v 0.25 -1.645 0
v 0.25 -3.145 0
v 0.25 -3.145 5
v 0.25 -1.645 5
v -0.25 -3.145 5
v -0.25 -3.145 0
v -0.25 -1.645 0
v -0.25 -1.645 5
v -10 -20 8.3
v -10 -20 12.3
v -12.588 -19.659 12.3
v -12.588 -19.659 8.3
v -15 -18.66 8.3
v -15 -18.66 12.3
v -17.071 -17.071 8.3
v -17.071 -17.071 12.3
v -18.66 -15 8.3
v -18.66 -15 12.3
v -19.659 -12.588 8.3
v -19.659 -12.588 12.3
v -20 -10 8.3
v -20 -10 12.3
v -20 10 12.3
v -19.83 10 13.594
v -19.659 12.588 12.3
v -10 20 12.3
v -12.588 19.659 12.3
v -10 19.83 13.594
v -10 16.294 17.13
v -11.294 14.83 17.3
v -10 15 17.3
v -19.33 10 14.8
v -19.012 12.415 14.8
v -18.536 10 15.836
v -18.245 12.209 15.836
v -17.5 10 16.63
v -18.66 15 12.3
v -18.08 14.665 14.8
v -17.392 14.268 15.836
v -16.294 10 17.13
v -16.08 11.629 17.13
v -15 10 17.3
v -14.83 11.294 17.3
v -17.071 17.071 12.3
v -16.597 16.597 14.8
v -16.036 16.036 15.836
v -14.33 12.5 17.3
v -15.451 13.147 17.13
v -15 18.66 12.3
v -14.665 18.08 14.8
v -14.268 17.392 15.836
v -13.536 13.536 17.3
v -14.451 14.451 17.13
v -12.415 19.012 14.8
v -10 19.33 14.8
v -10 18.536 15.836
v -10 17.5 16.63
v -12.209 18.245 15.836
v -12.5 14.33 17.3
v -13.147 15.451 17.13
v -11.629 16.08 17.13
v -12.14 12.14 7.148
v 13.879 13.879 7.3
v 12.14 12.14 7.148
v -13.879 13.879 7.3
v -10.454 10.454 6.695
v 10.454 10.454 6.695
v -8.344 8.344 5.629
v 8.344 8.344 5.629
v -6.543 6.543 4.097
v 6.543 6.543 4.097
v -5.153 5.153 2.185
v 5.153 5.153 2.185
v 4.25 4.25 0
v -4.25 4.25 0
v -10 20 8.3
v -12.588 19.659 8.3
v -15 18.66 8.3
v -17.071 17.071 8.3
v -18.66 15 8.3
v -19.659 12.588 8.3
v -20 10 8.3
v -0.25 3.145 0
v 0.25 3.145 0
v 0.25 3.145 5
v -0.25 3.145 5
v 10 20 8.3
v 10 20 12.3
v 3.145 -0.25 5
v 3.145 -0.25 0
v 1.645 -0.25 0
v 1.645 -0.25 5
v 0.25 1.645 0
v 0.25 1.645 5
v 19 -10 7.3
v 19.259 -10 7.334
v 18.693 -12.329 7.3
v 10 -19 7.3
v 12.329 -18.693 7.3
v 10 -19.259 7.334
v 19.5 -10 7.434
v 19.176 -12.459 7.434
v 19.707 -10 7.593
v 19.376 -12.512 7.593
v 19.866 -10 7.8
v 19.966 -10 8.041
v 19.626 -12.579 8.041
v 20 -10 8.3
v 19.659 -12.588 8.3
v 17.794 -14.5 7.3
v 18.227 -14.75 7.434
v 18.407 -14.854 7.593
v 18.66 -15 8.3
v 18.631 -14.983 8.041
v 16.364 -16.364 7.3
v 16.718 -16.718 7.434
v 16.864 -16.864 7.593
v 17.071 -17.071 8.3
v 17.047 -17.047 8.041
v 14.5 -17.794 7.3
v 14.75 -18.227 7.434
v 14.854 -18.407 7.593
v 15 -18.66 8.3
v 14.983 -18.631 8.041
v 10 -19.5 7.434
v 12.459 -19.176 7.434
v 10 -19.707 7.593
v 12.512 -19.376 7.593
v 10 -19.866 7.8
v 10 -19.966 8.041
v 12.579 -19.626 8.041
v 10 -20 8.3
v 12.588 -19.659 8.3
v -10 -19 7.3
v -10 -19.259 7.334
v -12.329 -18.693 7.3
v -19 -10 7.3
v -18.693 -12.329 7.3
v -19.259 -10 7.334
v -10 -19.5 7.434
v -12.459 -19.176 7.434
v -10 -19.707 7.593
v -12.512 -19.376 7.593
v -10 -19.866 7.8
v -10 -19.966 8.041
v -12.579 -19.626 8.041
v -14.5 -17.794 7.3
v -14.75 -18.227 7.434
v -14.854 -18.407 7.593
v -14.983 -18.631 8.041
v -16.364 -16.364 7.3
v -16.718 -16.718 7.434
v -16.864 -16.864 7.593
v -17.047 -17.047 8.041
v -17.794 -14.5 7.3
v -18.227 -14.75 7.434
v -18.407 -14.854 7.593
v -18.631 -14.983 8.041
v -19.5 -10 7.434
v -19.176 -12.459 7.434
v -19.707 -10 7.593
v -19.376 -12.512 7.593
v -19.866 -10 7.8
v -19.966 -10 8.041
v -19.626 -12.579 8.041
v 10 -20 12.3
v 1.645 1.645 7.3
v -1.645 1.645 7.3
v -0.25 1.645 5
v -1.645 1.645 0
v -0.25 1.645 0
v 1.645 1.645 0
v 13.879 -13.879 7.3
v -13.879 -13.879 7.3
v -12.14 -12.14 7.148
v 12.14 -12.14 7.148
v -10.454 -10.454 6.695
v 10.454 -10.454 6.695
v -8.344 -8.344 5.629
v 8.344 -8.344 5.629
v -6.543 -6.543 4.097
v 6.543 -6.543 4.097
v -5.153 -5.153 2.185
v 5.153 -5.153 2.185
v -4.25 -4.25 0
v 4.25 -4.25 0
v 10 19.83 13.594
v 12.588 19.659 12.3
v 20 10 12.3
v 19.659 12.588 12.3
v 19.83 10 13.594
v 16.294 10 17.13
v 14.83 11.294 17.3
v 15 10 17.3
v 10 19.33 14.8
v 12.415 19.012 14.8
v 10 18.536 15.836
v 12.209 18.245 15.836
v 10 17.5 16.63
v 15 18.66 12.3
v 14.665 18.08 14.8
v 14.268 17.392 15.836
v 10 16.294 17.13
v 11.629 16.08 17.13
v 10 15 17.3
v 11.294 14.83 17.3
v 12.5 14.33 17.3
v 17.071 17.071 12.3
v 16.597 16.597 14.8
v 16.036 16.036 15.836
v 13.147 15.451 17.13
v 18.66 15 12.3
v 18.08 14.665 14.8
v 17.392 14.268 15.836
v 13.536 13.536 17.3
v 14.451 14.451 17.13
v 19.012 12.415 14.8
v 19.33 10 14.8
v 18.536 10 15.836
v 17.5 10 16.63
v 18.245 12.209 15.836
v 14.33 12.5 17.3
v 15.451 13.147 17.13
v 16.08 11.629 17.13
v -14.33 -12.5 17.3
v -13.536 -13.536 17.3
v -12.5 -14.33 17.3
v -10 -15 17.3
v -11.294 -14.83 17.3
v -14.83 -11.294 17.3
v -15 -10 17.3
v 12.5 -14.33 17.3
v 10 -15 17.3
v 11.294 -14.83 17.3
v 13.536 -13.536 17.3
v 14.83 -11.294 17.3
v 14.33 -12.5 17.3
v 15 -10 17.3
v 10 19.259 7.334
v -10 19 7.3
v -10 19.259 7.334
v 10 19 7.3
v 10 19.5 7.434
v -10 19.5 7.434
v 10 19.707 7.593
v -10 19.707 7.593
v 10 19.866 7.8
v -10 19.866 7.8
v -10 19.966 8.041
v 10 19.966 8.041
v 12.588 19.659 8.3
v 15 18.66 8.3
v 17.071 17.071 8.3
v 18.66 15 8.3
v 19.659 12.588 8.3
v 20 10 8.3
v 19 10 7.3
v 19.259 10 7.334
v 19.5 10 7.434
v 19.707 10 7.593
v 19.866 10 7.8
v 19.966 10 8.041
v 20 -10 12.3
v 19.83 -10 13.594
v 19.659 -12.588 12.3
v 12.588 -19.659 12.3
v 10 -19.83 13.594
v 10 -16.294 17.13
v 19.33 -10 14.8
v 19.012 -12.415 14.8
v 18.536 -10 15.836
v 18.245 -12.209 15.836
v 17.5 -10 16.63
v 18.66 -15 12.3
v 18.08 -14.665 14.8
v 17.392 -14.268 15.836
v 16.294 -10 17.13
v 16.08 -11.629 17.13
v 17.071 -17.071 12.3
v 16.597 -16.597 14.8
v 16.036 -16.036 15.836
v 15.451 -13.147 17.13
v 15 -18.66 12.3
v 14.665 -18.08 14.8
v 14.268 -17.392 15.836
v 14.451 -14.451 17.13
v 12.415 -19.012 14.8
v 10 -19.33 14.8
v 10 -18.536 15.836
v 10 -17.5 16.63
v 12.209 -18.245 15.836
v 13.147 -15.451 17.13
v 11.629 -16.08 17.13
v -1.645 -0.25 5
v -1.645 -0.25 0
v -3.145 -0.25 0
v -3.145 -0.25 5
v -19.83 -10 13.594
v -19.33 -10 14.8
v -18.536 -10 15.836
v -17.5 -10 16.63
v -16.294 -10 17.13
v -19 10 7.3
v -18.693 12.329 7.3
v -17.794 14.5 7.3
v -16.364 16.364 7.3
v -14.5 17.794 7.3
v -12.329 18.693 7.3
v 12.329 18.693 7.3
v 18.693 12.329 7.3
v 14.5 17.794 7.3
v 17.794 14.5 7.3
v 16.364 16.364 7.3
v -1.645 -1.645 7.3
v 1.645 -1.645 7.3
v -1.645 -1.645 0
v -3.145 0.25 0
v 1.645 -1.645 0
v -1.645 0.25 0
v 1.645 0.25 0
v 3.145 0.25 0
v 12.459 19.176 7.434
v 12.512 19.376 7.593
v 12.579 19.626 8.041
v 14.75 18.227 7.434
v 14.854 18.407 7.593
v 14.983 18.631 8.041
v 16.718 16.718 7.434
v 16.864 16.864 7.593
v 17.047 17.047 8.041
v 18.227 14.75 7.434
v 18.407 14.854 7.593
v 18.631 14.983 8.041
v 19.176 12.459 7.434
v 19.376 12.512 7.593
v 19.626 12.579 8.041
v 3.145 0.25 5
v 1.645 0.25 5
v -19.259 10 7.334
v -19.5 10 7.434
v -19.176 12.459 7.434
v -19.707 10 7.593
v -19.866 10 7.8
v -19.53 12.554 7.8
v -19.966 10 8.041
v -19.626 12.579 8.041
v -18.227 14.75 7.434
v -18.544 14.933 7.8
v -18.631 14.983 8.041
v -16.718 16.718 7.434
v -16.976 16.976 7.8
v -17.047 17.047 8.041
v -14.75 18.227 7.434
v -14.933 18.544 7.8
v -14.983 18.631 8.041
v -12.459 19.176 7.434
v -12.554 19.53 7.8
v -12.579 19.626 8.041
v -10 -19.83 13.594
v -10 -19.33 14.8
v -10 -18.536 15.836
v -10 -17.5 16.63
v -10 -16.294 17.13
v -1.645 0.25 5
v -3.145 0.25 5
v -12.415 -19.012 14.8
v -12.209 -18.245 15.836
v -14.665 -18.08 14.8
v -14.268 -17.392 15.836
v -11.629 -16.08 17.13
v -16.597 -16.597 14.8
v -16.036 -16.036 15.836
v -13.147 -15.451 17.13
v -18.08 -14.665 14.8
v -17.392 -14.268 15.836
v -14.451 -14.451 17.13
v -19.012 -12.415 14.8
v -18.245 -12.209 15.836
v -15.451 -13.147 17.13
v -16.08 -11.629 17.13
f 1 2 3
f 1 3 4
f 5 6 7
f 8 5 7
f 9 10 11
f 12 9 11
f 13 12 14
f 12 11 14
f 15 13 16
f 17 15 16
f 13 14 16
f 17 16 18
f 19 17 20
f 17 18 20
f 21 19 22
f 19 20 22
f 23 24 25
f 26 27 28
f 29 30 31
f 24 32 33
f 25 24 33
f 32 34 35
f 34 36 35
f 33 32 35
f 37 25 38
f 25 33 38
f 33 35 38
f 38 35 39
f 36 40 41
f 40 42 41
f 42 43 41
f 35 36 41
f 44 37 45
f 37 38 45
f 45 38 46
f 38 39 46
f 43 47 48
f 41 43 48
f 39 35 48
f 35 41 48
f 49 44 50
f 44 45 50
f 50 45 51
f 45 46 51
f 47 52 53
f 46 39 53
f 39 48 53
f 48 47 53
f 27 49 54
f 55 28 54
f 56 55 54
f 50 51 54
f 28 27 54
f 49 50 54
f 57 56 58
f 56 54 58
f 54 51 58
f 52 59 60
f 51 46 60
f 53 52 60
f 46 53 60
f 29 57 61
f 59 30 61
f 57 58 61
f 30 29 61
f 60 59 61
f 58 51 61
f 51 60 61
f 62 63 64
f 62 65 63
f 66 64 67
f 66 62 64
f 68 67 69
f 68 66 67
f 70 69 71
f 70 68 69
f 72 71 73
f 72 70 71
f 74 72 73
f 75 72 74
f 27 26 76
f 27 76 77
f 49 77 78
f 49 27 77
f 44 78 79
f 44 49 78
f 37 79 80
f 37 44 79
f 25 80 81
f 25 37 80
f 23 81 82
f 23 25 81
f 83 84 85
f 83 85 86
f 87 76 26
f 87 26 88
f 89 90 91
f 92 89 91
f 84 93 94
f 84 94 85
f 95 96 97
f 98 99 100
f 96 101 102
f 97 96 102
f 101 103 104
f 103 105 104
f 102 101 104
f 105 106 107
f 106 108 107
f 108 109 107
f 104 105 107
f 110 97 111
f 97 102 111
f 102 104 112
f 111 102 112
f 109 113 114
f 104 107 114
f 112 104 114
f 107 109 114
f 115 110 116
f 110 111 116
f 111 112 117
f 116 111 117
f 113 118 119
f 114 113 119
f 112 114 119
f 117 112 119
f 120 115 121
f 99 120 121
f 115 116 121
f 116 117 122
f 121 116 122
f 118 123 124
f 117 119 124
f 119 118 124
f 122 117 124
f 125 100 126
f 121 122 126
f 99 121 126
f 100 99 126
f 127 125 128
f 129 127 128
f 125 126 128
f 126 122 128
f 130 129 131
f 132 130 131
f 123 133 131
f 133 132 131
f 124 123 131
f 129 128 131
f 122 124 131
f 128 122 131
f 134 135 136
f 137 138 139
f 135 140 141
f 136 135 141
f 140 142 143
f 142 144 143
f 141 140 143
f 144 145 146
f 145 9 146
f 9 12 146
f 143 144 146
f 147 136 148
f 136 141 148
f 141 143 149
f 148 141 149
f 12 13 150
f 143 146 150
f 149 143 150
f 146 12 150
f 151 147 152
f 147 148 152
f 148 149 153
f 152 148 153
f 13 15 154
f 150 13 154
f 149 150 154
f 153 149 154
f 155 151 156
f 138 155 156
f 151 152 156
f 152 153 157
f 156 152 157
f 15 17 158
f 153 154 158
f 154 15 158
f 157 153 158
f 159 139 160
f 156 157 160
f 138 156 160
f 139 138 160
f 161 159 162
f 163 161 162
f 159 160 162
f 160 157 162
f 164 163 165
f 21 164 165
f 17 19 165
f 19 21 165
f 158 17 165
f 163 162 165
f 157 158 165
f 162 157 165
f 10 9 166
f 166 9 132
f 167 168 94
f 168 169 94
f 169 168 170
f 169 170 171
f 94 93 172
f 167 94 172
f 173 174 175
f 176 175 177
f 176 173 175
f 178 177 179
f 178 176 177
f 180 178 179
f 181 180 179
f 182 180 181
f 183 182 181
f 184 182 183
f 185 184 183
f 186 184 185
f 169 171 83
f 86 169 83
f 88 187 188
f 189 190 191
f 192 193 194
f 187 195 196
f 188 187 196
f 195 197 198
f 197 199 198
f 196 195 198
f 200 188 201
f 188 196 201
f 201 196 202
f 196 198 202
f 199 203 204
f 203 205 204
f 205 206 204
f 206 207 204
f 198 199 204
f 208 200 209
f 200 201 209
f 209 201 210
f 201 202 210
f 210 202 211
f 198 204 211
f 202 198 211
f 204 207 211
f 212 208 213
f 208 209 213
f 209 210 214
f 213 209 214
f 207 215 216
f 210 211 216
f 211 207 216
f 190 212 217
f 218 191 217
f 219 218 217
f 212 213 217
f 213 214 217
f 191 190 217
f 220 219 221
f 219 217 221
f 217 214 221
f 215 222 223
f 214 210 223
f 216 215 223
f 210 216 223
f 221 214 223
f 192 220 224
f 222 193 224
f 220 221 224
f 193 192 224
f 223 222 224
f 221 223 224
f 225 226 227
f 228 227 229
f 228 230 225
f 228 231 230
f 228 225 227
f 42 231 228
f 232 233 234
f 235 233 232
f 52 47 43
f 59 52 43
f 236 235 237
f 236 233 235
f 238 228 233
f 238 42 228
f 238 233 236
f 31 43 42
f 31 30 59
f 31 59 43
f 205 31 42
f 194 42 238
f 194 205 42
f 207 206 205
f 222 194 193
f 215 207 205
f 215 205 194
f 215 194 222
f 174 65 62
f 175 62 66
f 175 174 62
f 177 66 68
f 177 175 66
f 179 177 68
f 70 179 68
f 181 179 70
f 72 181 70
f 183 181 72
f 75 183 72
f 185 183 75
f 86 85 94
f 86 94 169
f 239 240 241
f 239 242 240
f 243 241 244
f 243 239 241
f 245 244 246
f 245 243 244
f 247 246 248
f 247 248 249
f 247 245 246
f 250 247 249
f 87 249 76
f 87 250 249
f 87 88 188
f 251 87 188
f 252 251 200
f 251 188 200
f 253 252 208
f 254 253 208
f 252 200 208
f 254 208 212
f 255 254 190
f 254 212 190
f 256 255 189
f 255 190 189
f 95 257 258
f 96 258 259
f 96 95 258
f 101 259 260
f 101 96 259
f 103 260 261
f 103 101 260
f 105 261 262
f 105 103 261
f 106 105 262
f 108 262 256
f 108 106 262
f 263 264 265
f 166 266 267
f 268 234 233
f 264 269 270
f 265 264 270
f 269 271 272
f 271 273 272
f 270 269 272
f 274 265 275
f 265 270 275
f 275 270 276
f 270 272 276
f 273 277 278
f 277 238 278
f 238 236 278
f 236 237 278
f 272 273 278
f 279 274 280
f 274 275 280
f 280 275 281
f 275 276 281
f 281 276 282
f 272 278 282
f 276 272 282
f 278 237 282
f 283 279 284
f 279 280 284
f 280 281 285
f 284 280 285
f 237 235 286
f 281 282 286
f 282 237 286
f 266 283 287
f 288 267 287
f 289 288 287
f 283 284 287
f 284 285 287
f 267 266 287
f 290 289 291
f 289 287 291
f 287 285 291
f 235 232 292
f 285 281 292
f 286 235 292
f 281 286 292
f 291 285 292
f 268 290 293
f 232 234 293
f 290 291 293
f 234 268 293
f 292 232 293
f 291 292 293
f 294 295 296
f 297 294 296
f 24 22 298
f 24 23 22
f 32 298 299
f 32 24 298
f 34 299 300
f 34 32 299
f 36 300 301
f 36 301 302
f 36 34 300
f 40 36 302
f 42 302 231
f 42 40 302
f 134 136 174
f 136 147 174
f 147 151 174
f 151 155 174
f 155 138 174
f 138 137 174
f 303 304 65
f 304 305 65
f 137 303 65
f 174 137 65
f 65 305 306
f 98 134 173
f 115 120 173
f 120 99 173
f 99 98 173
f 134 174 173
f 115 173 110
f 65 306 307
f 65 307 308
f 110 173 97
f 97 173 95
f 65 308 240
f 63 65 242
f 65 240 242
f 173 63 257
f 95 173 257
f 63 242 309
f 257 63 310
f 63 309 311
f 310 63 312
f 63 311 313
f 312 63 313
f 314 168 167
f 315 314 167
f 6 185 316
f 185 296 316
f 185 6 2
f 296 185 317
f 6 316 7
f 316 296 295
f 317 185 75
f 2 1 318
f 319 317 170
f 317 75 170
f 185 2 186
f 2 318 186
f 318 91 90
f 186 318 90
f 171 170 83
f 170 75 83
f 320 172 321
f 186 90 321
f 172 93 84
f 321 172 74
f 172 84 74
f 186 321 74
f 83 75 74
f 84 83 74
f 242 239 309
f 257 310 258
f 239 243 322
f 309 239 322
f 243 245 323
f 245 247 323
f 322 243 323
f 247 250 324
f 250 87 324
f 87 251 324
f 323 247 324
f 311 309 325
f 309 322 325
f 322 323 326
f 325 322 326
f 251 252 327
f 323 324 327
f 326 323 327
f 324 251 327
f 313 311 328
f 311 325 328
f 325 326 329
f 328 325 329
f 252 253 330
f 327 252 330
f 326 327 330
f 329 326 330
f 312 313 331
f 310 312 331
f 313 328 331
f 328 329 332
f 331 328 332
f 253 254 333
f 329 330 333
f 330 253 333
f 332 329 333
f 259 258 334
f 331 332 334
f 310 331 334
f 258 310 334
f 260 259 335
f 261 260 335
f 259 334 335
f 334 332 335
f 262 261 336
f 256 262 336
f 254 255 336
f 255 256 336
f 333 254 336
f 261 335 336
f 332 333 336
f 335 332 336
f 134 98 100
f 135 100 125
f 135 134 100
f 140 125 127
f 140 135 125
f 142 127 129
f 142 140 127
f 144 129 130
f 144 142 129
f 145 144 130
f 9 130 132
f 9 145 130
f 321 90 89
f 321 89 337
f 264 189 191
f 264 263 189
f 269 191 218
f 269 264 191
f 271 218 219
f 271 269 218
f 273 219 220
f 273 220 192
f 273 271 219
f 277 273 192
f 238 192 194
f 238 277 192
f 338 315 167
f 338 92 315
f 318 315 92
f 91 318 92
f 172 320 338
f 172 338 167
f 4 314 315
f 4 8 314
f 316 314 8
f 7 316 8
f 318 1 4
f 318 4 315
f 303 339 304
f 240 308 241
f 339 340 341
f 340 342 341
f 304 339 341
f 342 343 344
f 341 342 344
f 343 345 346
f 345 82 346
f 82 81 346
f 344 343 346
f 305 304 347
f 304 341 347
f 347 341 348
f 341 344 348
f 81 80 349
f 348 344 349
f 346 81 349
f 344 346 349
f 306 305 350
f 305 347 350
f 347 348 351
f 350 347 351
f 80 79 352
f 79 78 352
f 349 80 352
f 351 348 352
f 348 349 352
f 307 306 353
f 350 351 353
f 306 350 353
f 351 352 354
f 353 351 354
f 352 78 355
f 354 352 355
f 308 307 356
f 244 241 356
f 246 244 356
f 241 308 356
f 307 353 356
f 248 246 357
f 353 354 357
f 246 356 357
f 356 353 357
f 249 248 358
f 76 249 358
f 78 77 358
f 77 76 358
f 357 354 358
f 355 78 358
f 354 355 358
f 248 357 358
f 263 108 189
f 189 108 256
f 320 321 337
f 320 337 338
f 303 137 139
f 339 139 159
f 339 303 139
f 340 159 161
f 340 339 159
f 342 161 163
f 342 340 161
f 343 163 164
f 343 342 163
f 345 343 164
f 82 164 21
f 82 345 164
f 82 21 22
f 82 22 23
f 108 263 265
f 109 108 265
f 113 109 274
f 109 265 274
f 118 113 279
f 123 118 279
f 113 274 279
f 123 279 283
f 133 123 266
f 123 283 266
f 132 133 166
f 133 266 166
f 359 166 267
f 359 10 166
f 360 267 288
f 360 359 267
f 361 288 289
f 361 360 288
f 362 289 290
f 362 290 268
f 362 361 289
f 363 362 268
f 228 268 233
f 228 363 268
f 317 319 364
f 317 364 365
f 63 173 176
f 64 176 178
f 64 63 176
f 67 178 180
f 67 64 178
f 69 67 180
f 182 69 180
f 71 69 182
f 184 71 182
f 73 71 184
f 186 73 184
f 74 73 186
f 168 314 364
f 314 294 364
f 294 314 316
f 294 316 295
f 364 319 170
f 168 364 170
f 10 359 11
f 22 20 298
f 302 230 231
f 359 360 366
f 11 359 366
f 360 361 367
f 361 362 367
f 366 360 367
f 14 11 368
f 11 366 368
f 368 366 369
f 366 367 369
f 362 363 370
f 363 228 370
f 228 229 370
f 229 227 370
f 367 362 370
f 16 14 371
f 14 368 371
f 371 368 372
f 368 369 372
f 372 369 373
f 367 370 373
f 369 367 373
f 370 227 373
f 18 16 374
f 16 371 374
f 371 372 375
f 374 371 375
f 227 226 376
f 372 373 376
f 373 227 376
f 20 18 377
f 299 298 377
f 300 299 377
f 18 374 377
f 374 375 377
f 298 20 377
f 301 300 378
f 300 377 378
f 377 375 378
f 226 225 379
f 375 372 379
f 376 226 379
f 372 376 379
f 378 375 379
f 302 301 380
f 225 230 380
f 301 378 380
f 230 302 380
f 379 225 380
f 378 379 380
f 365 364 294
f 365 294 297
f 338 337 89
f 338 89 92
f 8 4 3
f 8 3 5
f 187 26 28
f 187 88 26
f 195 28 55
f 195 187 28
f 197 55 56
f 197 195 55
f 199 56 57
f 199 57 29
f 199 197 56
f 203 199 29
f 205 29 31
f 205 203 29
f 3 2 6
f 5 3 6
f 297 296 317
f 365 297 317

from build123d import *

# Parameters (mm, degrees)
ESBO_O1_W                = 8.5
ESBO_O1_H                = 8.5
ESBO_O1_W_2              = 3.29
ESBO_O1_H_2              = 3.29
RESSALTO_EXTRUS_O1_DEPTH = 7.3
ESBO_O2_W                = 40
ESBO_O2_H                = 40
RESSALTO_EXTRUS_O2_DEPTH = 10
FILETE1_R                = 10
FILETE2_R                = 10
FILETE3_R                = 5
ESBO_O3_W                = 0.5
ESBO_O3_H                = 1.5
ESBO_O3_W_2              = 1.5
ESBO_O3_H_2              = 0.5
CORTE_EXTRUS_O1_DEPTH    = 5
FILETE4_R                = 1


with BuildPart() as part:
    # Esboço1 → Ressalto-extrusão1 (new body)
    with BuildSketch(Plane.XY):
        Rectangle(ESBO_O1_W, ESBO_O1_H)
        Rectangle(ESBO_O1_W_2, ESBO_O1_H_2, mode=Mode.SUBTRACT)
    extrude(amount=RESSALTO_EXTRUS_O1_DEPTH)

    # Esboço2 → Ressalto-extrusão2 (add)
    with BuildSketch(Plane.XY.offset(7.3)):
        Rectangle(ESBO_O2_W, ESBO_O2_H)
    extrude(amount=RESSALTO_EXTRUS_O2_DEPTH)

    # Filete1
    # the kernel refuses this fillet: 10 mm, written as the material it adds along each edge
    with BuildSketch(Plane(origin=(-4.25, -4.25, 7.3), x_dir=(-1, 0, 0), z_dir=(0, 1, 0)), Plane(origin=(4.25, -4.25, 7.3), x_dir=(0, -1, 0), z_dir=(-1, 0, 0)), Plane(origin=(4.25, 4.25, 7.3), x_dir=(1, 0, 0), z_dir=(0, -1, 0)), Plane(origin=(-4.25, 4.25, 7.3), x_dir=(0, 1, 0), z_dir=(1, 0, 0))) as filete1_piece_1:
        with BuildLine():
            CenterArc((9.628603222, -10), FILETE1_R, 90, 74.335733149)
            Line((0, -7.3), (-0.192572064, -7.246))
            ThreePointArc((-0.192572064, -7.246), (-0.2, -3.65), (-0.2, 0))
            Line((-0.2, 0), (0, 0.2))
            Line((0, 0.2), (9.628603222, 0.2))
            Line((9.628603222, 0.2), (9.628603222, 0))
        make_face()
    extrude(amount=8.5)
    with BuildSketch(Plane(origin=(4.25, -4.25, 7.3), x_dir=(0, -1, 0), z_dir=(-1, 0, 0))) as filete1_piece_2a_section:
        with BuildLine():
            CenterArc((9.628603222, -10), FILETE1_R, 90, 74.335733149)
            Line((0, -7.3), (-0.192572064, -7.246))
            ThreePointArc((-0.192572064, -7.246), (-0.2, -3.65), (-0.2, 0))
            Line((-0.2, 0), (0, 0.2))
            Line((0, 0.2), (9.628603222, 0.2))
            Line((9.628603222, 0.2), (9.628603222, 0))
        make_face()
    filete1_piece_2a = extrude(amount=32.571508054, mode=Mode.PRIVATE)
    filete1_piece_2a = split(filete1_piece_2a, bisect_by=Plane(origin=(-20, -6.528048656, 5.446397175), z_dir=(1, 0, 0)), keep=Keep.TOP, mode=Mode.PRIVATE)
    filete1_piece_2a = split(filete1_piece_2a, bisect_by=Plane(origin=(-4.25, -6.528048656, 5.446397175), z_dir=(-1, 0, 0)), keep=Keep.TOP, mode=Mode.PRIVATE)
    with BuildSketch(Plane(origin=(-4.25, -28.321508054, 7.3), x_dir=(-1, 0, 0), z_dir=(0, 1, 0))) as filete1_piece_2b_section:
        with BuildLine():
            CenterArc((9.628603222, -10), FILETE1_R, 90, 74.335733149)
            Line((0, -7.3), (-0.192572064, -7.246))
            ThreePointArc((-0.192572064, -7.246), (-0.2, -3.65), (-0.2, 0))
            Line((-0.2, 0), (0, 0.2))
            Line((0, 0.2), (9.628603222, 0.2))
            Line((9.628603222, 0.2), (9.628603222, 0))
        make_face()
    filete1_piece_2b = extrude(amount=32.571508054, mode=Mode.PRIVATE)
    filete1_piece_2b = split(filete1_piece_2b, bisect_by=Plane(origin=(-6.528048656, -20, 5.446397175), z_dir=(0, 1, 0)), keep=Keep.TOP, mode=Mode.PRIVATE)
    filete1_piece_2b = split(filete1_piece_2b, bisect_by=Plane(origin=(-6.528048656, -4.25, 5.446397175), z_dir=(0, -1, 0)), keep=Keep.TOP, mode=Mode.PRIVATE)
    filete1_piece_2 = filete1_piece_2a & filete1_piece_2b
    add(filete1_piece_2)
    with BuildSketch(Plane(origin=(-28.321508054, 4.25, 7.3), x_dir=(0, 1, 0), z_dir=(1, 0, 0))) as filete1_piece_3a_section:
        with BuildLine():
            CenterArc((9.628603222, -10), FILETE1_R, 90, 74.335733149)
            Line((0, -7.3), (-0.192572064, -7.246))
            ThreePointArc((-0.192572064, -7.246), (-0.2, -3.65), (-0.2, 0))
            Line((-0.2, 0), (0, 0.2))
            Line((0, 0.2), (9.628603222, 0.2))
            Line((9.628603222, 0.2), (9.628603222, 0))
        make_face()
    filete1_piece_3a = extrude(amount=32.571508054, mode=Mode.PRIVATE)
    filete1_piece_3a = split(filete1_piece_3a, bisect_by=Plane(origin=(-20, 6.528048656, 5.446397175), z_dir=(1, 0, 0)), keep=Keep.TOP, mode=Mode.PRIVATE)
    filete1_piece_3a = split(filete1_piece_3a, bisect_by=Plane(origin=(-4.25, 6.528048656, 5.446397175), z_dir=(-1, 0, 0)), keep=Keep.TOP, mode=Mode.PRIVATE)
    with BuildSketch(Plane(origin=(-4.25, -4.25, 7.3), x_dir=(-1, 0, 0), z_dir=(0, 1, 0))) as filete1_piece_3b_section:
        with BuildLine():
            CenterArc((9.628603222, -10), FILETE1_R, 90, 74.335733149)
            Line((0, -7.3), (-0.192572064, -7.246))
            ThreePointArc((-0.192572064, -7.246), (-0.2, -3.65), (-0.2, 0))
            Line((-0.2, 0), (0, 0.2))
            Line((0, 0.2), (9.628603222, 0.2))
            Line((9.628603222, 0.2), (9.628603222, 0))
        make_face()
    filete1_piece_3b = extrude(amount=32.571508054, mode=Mode.PRIVATE)
    filete1_piece_3b = split(filete1_piece_3b, bisect_by=Plane(origin=(-6.528048656, 20, 5.446397175), z_dir=(0, -1, 0)), keep=Keep.TOP, mode=Mode.PRIVATE)
    filete1_piece_3b = split(filete1_piece_3b, bisect_by=Plane(origin=(-6.528048656, 4.25, 5.446397175), z_dir=(0, 1, 0)), keep=Keep.TOP, mode=Mode.PRIVATE)
    filete1_piece_3 = filete1_piece_3a & filete1_piece_3b
    add(filete1_piece_3)
    with BuildSketch(Plane(origin=(4.25, 4.25, 7.3), x_dir=(1, 0, 0), z_dir=(0, -1, 0))) as filete1_piece_4a_section:
        with BuildLine():
            CenterArc((9.628603222, -10), FILETE1_R, 90, 74.335733149)
            Line((0, -7.3), (-0.192572064, -7.246))
            ThreePointArc((-0.192572064, -7.246), (-0.2, -3.65), (-0.2, 0))
            Line((-0.2, 0), (0, 0.2))
            Line((0, 0.2), (9.628603222, 0.2))
            Line((9.628603222, 0.2), (9.628603222, 0))
        make_face()
    filete1_piece_4a = extrude(amount=32.571508054, mode=Mode.PRIVATE)
    filete1_piece_4a = split(filete1_piece_4a, bisect_by=Plane(origin=(6.528048656, -20, 5.446397175), z_dir=(0, 1, 0)), keep=Keep.TOP, mode=Mode.PRIVATE)
    filete1_piece_4a = split(filete1_piece_4a, bisect_by=Plane(origin=(6.528048656, -4.25, 5.446397175), z_dir=(0, -1, 0)), keep=Keep.TOP, mode=Mode.PRIVATE)
    with BuildSketch(Plane(origin=(28.321508054, -4.25, 7.3), x_dir=(0, -1, 0), z_dir=(-1, 0, 0))) as filete1_piece_4b_section:
        with BuildLine():
            CenterArc((9.628603222, -10), FILETE1_R, 90, 74.335733149)
            Line((0, -7.3), (-0.192572064, -7.246))
            ThreePointArc((-0.192572064, -7.246), (-0.2, -3.65), (-0.2, 0))
            Line((-0.2, 0), (0, 0.2))
            Line((0, 0.2), (9.628603222, 0.2))
            Line((9.628603222, 0.2), (9.628603222, 0))
        make_face()
    filete1_piece_4b = extrude(amount=32.571508054, mode=Mode.PRIVATE)
    filete1_piece_4b = split(filete1_piece_4b, bisect_by=Plane(origin=(20, -6.528048656, 5.446397175), z_dir=(-1, 0, 0)), keep=Keep.TOP, mode=Mode.PRIVATE)
    filete1_piece_4b = split(filete1_piece_4b, bisect_by=Plane(origin=(4.25, -6.528048656, 5.446397175), z_dir=(1, 0, 0)), keep=Keep.TOP, mode=Mode.PRIVATE)
    filete1_piece_4 = filete1_piece_4a & filete1_piece_4b
    add(filete1_piece_4)
    with BuildSketch(Plane(origin=(-4.25, 4.25, 7.3), x_dir=(0, 1, 0), z_dir=(1, 0, 0))) as filete1_piece_5a_section:
        with BuildLine():
            CenterArc((9.628603222, -10), FILETE1_R, 90, 74.335733149)
            Line((0, -7.3), (-0.192572064, -7.246))
            ThreePointArc((-0.192572064, -7.246), (-0.2, -3.65), (-0.2, 0))
            Line((-0.2, 0), (0, 0.2))
            Line((0, 0.2), (9.628603222, 0.2))
            Line((9.628603222, 0.2), (9.628603222, 0))
        make_face()
    filete1_piece_5a = extrude(amount=32.571508054, mode=Mode.PRIVATE)
    filete1_piece_5a = split(filete1_piece_5a, bisect_by=Plane(origin=(20, 6.528048656, 5.446397175), z_dir=(-1, 0, 0)), keep=Keep.TOP, mode=Mode.PRIVATE)
    filete1_piece_5a = split(filete1_piece_5a, bisect_by=Plane(origin=(4.25, 6.528048656, 5.446397175), z_dir=(1, 0, 0)), keep=Keep.TOP, mode=Mode.PRIVATE)
    with BuildSketch(Plane(origin=(4.25, 28.321508054, 7.3), x_dir=(1, 0, 0), z_dir=(0, -1, 0))) as filete1_piece_5b_section:
        with BuildLine():
            CenterArc((9.628603222, -10), FILETE1_R, 90, 74.335733149)
            Line((0, -7.3), (-0.192572064, -7.246))
            ThreePointArc((-0.192572064, -7.246), (-0.2, -3.65), (-0.2, 0))
            Line((-0.2, 0), (0, 0.2))
            Line((0, 0.2), (9.628603222, 0.2))
            Line((9.628603222, 0.2), (9.628603222, 0))
        make_face()
    filete1_piece_5b = extrude(amount=32.571508054, mode=Mode.PRIVATE)
    filete1_piece_5b = split(filete1_piece_5b, bisect_by=Plane(origin=(6.528048656, 20, 5.446397175), z_dir=(0, -1, 0)), keep=Keep.TOP, mode=Mode.PRIVATE)
    filete1_piece_5b = split(filete1_piece_5b, bisect_by=Plane(origin=(6.528048656, 4.25, 5.446397175), z_dir=(0, 1, 0)), keep=Keep.TOP, mode=Mode.PRIVATE)
    filete1_piece_5 = filete1_piece_5a & filete1_piece_5b
    add(filete1_piece_5)

    # Filete2
    filete2_edges = [part.edges().sort_by_distance(p)[0] for p in [
        (-20, 20, 12.3),
        (-20, -20, 12.3),
        (20, -20, 12.3),
        (20, 20, 12.3),
    ]]
    fillet(filete2_edges, radius=FILETE2_R)

    # Filete3
    filete3_edges = [part.edges().sort_by_distance(p)[0] for p in [
        (0, 20, 17.3),
        (20, 0, 17.3),
        (-20, 0, 17.3),
        (0, -20, 17.3),
        (-17.071067812, 17.071067812, 17.3),
        (-17.071067812, -17.071067812, 17.3),
        (17.071067812, -17.071067812, 17.3),
        (17.071067812, 17.071067812, 17.3),
    ]]
    fillet(filete3_edges, radius=FILETE3_R)

    # Esboço3 → Corte-extrusão1 (cut)
    with BuildSketch(Plane(origin=(0, 0, 0), x_dir=(-1, 0, 0), z_dir=(0, 0, -1))):
        with Locations((0, 2.395)):
            Rectangle(ESBO_O3_W, ESBO_O3_H)
        with Locations((0, -2.395)):
            Rectangle(ESBO_O3_W, ESBO_O3_H)
        with Locations((2.395, 0)):
            Rectangle(ESBO_O3_W_2, ESBO_O3_H_2)
        with Locations((-2.395, 0)):
            Rectangle(ESBO_O3_W_2, ESBO_O3_H_2)
    extrude(amount=-CORTE_EXTRUS_O1_DEPTH, mode=Mode.SUBTRACT)

    # Filete4
    filete4_edges = [part.edges().sort_by_distance(p)[0] for p in [
        (0, 20, 7.3),
        (-20, 0, 7.3),
        (20, 0, 7.3),
        (0, -20, 7.3),
        (-17.071067812, 17.071067812, 7.3),
        (-17.071067812, -17.071067812, 7.3),
        (17.071067812, -17.071067812, 7.3),
        (17.071067812, 17.071067812, 7.3),
    ]]
    fillet(filete4_edges, radius=FILETE4_R)


solid = part.part
